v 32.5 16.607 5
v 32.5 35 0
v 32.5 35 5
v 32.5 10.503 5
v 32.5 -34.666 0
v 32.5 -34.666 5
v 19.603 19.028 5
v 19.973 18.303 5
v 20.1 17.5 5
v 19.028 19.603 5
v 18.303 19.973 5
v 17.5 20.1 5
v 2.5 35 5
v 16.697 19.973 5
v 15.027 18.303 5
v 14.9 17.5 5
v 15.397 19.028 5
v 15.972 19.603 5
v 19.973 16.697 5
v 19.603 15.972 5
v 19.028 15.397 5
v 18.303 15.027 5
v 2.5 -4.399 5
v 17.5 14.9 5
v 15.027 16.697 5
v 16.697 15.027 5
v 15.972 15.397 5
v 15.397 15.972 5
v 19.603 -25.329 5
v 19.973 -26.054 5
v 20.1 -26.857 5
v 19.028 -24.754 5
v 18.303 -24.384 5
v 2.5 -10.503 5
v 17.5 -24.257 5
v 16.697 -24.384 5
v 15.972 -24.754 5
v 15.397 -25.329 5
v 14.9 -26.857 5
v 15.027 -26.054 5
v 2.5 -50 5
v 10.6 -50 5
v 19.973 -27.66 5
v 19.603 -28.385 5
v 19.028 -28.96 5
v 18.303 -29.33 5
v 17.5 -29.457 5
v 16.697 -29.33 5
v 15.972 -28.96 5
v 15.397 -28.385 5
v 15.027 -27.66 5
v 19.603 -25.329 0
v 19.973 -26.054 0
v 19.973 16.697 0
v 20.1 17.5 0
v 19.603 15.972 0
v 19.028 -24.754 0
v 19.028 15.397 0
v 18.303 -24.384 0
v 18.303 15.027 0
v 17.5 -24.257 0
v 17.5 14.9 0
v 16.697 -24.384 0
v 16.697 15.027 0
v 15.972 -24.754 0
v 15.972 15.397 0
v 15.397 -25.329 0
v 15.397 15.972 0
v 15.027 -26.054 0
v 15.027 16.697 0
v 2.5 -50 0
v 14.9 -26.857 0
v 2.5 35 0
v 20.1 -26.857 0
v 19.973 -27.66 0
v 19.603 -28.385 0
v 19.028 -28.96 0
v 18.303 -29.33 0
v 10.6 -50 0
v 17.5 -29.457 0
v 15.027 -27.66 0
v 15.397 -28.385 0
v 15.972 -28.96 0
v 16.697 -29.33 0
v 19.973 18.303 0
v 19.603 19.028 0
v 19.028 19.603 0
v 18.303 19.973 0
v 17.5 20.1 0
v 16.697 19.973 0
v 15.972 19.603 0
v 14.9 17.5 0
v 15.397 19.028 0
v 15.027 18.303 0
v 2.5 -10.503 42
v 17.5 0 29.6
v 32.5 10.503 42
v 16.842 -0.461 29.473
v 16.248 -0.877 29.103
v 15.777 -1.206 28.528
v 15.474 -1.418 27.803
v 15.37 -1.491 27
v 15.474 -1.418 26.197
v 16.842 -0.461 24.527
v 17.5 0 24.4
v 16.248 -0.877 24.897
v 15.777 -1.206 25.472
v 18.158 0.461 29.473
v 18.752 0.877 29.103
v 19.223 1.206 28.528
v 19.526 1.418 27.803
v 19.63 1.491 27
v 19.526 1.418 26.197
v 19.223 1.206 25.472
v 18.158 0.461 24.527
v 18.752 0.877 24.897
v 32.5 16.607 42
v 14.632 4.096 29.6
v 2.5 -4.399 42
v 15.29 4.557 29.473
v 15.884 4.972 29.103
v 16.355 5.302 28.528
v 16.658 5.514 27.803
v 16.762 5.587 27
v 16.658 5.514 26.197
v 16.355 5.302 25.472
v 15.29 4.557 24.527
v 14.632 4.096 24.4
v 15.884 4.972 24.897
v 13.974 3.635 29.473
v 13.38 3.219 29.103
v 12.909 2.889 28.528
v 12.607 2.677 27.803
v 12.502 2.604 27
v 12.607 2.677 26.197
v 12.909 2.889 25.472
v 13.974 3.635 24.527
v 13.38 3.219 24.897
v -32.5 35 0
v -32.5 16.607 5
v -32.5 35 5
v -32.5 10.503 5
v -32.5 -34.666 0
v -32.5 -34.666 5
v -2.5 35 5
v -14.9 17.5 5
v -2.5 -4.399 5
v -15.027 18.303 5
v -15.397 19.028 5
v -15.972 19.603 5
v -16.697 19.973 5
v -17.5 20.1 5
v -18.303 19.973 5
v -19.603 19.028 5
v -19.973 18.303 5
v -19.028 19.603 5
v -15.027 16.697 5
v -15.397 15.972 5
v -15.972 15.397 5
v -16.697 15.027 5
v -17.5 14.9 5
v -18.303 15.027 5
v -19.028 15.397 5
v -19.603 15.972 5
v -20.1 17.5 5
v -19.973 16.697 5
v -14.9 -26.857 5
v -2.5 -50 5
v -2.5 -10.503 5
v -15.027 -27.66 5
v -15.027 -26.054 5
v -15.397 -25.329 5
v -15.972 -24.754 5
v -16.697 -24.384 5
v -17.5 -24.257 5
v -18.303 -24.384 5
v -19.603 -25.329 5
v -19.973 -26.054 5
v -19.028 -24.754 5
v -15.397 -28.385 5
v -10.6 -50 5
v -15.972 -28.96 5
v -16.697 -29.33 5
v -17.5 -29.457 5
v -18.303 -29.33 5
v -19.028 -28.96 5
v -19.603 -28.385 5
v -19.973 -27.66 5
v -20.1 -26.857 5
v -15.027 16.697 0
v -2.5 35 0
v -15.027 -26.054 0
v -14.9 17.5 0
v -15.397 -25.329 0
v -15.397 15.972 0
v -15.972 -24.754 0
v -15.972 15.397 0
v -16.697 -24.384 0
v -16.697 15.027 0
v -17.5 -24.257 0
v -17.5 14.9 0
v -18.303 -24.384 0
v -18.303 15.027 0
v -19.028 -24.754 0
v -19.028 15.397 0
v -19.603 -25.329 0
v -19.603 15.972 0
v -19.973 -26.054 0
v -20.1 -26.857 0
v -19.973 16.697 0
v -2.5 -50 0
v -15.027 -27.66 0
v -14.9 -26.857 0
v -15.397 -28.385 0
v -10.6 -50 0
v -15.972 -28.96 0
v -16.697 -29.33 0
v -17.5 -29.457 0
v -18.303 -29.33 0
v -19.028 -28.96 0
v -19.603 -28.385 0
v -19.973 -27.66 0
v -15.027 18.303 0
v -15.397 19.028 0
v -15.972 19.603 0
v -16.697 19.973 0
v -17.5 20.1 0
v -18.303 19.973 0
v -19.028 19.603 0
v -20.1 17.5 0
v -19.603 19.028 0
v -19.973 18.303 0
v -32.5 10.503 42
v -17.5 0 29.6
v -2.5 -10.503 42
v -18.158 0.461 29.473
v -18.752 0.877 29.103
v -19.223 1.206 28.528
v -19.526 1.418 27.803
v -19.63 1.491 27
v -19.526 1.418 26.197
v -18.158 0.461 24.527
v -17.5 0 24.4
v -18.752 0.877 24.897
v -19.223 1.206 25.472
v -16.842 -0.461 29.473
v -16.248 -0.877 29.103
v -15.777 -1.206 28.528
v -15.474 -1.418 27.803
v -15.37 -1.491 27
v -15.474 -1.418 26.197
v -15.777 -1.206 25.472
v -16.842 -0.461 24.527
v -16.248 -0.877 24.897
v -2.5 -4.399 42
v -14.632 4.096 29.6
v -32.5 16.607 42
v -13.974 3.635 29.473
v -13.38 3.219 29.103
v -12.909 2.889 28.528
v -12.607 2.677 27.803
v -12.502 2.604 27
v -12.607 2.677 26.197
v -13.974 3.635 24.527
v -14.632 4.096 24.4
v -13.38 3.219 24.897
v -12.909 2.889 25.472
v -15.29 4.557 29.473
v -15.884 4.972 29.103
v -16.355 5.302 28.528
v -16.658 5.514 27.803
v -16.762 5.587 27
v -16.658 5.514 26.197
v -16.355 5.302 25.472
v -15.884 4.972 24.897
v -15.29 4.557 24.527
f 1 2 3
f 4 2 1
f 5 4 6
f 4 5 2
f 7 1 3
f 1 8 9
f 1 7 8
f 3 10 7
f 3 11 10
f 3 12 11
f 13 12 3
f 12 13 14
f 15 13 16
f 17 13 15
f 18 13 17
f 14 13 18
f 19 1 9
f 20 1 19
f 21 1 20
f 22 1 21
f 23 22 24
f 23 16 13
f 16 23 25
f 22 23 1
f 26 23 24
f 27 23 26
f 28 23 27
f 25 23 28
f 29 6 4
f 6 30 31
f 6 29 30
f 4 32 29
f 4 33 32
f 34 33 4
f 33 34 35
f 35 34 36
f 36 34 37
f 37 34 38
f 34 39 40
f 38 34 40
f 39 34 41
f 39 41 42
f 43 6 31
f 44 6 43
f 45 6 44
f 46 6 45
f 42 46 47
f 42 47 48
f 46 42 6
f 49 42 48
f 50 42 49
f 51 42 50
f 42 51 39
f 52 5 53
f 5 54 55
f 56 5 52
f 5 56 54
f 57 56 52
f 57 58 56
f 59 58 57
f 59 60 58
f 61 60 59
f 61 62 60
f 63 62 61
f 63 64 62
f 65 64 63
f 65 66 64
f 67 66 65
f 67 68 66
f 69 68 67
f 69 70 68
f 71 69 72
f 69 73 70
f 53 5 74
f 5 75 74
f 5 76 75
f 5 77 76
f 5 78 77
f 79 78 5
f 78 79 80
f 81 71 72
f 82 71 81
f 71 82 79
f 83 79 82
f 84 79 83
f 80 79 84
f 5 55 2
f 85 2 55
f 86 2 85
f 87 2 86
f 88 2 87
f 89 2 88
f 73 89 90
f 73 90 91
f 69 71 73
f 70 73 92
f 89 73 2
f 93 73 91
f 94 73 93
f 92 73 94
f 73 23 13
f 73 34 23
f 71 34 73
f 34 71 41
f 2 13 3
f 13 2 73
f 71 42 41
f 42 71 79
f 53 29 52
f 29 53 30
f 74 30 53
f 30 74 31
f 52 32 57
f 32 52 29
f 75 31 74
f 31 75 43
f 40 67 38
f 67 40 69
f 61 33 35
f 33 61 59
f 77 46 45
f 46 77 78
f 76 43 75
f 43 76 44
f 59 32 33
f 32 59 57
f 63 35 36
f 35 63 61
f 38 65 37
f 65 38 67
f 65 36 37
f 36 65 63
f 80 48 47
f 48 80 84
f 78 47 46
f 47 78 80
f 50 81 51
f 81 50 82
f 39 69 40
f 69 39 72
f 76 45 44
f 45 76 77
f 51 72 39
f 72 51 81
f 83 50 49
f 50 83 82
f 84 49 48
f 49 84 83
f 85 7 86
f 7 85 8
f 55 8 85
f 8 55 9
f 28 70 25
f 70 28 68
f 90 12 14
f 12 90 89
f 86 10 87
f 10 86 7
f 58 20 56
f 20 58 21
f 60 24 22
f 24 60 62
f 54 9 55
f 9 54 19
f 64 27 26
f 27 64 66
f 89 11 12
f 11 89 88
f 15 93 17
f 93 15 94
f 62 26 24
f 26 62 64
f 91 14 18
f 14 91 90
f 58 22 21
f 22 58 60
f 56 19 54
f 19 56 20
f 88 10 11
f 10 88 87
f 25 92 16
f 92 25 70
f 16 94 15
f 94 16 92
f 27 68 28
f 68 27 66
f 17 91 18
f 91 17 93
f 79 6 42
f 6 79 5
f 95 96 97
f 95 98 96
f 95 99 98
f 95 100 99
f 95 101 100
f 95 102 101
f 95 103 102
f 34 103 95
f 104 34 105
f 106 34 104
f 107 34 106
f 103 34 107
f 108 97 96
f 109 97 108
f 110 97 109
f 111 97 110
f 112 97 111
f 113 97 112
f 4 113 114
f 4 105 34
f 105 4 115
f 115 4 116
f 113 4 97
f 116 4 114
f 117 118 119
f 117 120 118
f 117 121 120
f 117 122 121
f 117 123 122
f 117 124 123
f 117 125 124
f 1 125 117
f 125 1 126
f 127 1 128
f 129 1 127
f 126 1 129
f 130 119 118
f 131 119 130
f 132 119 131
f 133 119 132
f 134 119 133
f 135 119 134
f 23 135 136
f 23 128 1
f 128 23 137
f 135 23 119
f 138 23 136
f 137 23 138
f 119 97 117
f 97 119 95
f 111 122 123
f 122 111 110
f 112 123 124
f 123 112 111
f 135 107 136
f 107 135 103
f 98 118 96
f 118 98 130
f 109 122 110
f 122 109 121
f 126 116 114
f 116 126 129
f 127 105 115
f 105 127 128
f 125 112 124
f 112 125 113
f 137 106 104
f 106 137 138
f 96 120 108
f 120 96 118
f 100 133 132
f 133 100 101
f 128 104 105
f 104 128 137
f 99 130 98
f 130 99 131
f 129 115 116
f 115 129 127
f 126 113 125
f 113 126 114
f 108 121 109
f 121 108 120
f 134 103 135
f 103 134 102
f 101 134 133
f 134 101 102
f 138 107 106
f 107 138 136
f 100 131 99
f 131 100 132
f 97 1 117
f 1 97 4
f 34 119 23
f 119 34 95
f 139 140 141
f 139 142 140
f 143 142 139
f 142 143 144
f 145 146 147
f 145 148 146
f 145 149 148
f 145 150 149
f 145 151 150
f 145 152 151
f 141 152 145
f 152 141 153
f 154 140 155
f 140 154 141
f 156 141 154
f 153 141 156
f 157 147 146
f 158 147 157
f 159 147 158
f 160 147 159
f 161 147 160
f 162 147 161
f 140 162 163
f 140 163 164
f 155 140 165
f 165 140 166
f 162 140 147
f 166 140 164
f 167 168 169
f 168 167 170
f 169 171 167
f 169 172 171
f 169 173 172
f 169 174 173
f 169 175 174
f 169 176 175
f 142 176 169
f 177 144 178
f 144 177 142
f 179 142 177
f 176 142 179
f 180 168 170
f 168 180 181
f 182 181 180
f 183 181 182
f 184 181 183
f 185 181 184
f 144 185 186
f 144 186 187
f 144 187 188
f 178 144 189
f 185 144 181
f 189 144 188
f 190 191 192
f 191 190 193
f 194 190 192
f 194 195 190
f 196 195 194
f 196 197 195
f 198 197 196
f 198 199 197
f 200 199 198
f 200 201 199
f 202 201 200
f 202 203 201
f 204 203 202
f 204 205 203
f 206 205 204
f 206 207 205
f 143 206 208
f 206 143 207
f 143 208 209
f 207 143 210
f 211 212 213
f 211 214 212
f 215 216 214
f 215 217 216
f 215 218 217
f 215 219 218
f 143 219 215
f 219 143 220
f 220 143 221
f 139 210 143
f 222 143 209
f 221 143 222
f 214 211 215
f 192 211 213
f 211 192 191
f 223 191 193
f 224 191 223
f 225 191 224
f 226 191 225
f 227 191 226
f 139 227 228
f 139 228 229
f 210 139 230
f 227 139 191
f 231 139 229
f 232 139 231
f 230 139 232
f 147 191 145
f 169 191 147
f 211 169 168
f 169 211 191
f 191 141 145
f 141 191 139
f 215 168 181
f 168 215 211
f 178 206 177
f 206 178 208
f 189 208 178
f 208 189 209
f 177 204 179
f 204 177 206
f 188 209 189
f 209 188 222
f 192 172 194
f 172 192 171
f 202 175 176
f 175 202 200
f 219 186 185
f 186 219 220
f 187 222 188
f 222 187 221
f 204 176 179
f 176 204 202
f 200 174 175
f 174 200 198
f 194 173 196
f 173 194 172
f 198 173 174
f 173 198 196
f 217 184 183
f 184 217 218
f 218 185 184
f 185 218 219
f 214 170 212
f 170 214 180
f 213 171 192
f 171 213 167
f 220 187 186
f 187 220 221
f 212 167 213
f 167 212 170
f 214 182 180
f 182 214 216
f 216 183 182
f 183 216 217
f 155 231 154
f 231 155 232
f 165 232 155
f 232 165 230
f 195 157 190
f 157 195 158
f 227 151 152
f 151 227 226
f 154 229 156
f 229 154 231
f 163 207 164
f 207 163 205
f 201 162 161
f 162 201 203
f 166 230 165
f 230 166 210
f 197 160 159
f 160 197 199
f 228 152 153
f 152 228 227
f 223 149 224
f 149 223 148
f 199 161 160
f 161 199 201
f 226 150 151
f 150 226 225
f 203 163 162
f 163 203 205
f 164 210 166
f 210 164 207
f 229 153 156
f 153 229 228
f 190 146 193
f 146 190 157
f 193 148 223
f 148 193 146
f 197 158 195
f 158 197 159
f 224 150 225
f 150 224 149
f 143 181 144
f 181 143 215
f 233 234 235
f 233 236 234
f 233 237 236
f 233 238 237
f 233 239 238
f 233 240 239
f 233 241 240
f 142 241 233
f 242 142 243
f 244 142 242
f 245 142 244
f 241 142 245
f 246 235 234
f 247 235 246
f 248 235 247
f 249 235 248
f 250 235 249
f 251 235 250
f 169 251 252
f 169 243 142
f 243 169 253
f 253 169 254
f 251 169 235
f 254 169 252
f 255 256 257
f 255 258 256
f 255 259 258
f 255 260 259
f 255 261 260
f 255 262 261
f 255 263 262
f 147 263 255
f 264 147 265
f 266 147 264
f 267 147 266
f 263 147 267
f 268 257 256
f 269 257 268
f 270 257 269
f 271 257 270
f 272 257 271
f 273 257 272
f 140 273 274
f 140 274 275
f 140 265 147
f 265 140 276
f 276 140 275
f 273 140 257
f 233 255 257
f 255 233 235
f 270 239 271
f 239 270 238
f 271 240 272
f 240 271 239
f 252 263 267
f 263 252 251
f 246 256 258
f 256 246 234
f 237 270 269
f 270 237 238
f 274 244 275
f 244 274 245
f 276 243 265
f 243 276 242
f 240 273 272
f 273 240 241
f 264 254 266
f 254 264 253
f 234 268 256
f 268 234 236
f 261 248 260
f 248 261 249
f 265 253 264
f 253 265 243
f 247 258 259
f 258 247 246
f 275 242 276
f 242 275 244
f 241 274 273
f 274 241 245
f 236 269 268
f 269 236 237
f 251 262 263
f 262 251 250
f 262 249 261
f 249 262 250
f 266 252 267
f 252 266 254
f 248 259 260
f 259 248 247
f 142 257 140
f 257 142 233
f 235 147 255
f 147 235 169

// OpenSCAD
material = 5;
width = 30;
height = 85;

module podpera(){
difference(){

translate([-width/2,-50,0])cube([width,height,material]);
translate([0,-22/cos(35),-0.01])#cylinder(r=5.2/2, h=8,$fn=20);
translate([0,(height-50)/2,-0.01])#cylinder(r=5.2/2, h=8,$fn=20);

translate([0,-37/cos(35),0])
 rotate([0,0,35])
  translate([-((width*2)/cos(35))/2,-50,-0.5])
     cube([(width*2)/cos(35),50,material+1]);


}

difference(){
translate([0,0,material])
rotate([90,0,35])
translate([-width,0,-material])
difference(){
 cube([width*2,37,material]);
 translate([width,22,-0.01])
   #cylinder(r=5.2/2,h=8,$fn=20);
   
}
translate([width/2,-height/2,-1])cube([width*2,height,37+material+2]);
translate([-width/2-width*2,-height/2,-1])cube([width*2,height,37+material+2]);
}
}
translate([(width)/2+2.5,0,0])podpera();
translate([-(width)/2-2.5,0,0])mirror([1,0,0]) podpera();
